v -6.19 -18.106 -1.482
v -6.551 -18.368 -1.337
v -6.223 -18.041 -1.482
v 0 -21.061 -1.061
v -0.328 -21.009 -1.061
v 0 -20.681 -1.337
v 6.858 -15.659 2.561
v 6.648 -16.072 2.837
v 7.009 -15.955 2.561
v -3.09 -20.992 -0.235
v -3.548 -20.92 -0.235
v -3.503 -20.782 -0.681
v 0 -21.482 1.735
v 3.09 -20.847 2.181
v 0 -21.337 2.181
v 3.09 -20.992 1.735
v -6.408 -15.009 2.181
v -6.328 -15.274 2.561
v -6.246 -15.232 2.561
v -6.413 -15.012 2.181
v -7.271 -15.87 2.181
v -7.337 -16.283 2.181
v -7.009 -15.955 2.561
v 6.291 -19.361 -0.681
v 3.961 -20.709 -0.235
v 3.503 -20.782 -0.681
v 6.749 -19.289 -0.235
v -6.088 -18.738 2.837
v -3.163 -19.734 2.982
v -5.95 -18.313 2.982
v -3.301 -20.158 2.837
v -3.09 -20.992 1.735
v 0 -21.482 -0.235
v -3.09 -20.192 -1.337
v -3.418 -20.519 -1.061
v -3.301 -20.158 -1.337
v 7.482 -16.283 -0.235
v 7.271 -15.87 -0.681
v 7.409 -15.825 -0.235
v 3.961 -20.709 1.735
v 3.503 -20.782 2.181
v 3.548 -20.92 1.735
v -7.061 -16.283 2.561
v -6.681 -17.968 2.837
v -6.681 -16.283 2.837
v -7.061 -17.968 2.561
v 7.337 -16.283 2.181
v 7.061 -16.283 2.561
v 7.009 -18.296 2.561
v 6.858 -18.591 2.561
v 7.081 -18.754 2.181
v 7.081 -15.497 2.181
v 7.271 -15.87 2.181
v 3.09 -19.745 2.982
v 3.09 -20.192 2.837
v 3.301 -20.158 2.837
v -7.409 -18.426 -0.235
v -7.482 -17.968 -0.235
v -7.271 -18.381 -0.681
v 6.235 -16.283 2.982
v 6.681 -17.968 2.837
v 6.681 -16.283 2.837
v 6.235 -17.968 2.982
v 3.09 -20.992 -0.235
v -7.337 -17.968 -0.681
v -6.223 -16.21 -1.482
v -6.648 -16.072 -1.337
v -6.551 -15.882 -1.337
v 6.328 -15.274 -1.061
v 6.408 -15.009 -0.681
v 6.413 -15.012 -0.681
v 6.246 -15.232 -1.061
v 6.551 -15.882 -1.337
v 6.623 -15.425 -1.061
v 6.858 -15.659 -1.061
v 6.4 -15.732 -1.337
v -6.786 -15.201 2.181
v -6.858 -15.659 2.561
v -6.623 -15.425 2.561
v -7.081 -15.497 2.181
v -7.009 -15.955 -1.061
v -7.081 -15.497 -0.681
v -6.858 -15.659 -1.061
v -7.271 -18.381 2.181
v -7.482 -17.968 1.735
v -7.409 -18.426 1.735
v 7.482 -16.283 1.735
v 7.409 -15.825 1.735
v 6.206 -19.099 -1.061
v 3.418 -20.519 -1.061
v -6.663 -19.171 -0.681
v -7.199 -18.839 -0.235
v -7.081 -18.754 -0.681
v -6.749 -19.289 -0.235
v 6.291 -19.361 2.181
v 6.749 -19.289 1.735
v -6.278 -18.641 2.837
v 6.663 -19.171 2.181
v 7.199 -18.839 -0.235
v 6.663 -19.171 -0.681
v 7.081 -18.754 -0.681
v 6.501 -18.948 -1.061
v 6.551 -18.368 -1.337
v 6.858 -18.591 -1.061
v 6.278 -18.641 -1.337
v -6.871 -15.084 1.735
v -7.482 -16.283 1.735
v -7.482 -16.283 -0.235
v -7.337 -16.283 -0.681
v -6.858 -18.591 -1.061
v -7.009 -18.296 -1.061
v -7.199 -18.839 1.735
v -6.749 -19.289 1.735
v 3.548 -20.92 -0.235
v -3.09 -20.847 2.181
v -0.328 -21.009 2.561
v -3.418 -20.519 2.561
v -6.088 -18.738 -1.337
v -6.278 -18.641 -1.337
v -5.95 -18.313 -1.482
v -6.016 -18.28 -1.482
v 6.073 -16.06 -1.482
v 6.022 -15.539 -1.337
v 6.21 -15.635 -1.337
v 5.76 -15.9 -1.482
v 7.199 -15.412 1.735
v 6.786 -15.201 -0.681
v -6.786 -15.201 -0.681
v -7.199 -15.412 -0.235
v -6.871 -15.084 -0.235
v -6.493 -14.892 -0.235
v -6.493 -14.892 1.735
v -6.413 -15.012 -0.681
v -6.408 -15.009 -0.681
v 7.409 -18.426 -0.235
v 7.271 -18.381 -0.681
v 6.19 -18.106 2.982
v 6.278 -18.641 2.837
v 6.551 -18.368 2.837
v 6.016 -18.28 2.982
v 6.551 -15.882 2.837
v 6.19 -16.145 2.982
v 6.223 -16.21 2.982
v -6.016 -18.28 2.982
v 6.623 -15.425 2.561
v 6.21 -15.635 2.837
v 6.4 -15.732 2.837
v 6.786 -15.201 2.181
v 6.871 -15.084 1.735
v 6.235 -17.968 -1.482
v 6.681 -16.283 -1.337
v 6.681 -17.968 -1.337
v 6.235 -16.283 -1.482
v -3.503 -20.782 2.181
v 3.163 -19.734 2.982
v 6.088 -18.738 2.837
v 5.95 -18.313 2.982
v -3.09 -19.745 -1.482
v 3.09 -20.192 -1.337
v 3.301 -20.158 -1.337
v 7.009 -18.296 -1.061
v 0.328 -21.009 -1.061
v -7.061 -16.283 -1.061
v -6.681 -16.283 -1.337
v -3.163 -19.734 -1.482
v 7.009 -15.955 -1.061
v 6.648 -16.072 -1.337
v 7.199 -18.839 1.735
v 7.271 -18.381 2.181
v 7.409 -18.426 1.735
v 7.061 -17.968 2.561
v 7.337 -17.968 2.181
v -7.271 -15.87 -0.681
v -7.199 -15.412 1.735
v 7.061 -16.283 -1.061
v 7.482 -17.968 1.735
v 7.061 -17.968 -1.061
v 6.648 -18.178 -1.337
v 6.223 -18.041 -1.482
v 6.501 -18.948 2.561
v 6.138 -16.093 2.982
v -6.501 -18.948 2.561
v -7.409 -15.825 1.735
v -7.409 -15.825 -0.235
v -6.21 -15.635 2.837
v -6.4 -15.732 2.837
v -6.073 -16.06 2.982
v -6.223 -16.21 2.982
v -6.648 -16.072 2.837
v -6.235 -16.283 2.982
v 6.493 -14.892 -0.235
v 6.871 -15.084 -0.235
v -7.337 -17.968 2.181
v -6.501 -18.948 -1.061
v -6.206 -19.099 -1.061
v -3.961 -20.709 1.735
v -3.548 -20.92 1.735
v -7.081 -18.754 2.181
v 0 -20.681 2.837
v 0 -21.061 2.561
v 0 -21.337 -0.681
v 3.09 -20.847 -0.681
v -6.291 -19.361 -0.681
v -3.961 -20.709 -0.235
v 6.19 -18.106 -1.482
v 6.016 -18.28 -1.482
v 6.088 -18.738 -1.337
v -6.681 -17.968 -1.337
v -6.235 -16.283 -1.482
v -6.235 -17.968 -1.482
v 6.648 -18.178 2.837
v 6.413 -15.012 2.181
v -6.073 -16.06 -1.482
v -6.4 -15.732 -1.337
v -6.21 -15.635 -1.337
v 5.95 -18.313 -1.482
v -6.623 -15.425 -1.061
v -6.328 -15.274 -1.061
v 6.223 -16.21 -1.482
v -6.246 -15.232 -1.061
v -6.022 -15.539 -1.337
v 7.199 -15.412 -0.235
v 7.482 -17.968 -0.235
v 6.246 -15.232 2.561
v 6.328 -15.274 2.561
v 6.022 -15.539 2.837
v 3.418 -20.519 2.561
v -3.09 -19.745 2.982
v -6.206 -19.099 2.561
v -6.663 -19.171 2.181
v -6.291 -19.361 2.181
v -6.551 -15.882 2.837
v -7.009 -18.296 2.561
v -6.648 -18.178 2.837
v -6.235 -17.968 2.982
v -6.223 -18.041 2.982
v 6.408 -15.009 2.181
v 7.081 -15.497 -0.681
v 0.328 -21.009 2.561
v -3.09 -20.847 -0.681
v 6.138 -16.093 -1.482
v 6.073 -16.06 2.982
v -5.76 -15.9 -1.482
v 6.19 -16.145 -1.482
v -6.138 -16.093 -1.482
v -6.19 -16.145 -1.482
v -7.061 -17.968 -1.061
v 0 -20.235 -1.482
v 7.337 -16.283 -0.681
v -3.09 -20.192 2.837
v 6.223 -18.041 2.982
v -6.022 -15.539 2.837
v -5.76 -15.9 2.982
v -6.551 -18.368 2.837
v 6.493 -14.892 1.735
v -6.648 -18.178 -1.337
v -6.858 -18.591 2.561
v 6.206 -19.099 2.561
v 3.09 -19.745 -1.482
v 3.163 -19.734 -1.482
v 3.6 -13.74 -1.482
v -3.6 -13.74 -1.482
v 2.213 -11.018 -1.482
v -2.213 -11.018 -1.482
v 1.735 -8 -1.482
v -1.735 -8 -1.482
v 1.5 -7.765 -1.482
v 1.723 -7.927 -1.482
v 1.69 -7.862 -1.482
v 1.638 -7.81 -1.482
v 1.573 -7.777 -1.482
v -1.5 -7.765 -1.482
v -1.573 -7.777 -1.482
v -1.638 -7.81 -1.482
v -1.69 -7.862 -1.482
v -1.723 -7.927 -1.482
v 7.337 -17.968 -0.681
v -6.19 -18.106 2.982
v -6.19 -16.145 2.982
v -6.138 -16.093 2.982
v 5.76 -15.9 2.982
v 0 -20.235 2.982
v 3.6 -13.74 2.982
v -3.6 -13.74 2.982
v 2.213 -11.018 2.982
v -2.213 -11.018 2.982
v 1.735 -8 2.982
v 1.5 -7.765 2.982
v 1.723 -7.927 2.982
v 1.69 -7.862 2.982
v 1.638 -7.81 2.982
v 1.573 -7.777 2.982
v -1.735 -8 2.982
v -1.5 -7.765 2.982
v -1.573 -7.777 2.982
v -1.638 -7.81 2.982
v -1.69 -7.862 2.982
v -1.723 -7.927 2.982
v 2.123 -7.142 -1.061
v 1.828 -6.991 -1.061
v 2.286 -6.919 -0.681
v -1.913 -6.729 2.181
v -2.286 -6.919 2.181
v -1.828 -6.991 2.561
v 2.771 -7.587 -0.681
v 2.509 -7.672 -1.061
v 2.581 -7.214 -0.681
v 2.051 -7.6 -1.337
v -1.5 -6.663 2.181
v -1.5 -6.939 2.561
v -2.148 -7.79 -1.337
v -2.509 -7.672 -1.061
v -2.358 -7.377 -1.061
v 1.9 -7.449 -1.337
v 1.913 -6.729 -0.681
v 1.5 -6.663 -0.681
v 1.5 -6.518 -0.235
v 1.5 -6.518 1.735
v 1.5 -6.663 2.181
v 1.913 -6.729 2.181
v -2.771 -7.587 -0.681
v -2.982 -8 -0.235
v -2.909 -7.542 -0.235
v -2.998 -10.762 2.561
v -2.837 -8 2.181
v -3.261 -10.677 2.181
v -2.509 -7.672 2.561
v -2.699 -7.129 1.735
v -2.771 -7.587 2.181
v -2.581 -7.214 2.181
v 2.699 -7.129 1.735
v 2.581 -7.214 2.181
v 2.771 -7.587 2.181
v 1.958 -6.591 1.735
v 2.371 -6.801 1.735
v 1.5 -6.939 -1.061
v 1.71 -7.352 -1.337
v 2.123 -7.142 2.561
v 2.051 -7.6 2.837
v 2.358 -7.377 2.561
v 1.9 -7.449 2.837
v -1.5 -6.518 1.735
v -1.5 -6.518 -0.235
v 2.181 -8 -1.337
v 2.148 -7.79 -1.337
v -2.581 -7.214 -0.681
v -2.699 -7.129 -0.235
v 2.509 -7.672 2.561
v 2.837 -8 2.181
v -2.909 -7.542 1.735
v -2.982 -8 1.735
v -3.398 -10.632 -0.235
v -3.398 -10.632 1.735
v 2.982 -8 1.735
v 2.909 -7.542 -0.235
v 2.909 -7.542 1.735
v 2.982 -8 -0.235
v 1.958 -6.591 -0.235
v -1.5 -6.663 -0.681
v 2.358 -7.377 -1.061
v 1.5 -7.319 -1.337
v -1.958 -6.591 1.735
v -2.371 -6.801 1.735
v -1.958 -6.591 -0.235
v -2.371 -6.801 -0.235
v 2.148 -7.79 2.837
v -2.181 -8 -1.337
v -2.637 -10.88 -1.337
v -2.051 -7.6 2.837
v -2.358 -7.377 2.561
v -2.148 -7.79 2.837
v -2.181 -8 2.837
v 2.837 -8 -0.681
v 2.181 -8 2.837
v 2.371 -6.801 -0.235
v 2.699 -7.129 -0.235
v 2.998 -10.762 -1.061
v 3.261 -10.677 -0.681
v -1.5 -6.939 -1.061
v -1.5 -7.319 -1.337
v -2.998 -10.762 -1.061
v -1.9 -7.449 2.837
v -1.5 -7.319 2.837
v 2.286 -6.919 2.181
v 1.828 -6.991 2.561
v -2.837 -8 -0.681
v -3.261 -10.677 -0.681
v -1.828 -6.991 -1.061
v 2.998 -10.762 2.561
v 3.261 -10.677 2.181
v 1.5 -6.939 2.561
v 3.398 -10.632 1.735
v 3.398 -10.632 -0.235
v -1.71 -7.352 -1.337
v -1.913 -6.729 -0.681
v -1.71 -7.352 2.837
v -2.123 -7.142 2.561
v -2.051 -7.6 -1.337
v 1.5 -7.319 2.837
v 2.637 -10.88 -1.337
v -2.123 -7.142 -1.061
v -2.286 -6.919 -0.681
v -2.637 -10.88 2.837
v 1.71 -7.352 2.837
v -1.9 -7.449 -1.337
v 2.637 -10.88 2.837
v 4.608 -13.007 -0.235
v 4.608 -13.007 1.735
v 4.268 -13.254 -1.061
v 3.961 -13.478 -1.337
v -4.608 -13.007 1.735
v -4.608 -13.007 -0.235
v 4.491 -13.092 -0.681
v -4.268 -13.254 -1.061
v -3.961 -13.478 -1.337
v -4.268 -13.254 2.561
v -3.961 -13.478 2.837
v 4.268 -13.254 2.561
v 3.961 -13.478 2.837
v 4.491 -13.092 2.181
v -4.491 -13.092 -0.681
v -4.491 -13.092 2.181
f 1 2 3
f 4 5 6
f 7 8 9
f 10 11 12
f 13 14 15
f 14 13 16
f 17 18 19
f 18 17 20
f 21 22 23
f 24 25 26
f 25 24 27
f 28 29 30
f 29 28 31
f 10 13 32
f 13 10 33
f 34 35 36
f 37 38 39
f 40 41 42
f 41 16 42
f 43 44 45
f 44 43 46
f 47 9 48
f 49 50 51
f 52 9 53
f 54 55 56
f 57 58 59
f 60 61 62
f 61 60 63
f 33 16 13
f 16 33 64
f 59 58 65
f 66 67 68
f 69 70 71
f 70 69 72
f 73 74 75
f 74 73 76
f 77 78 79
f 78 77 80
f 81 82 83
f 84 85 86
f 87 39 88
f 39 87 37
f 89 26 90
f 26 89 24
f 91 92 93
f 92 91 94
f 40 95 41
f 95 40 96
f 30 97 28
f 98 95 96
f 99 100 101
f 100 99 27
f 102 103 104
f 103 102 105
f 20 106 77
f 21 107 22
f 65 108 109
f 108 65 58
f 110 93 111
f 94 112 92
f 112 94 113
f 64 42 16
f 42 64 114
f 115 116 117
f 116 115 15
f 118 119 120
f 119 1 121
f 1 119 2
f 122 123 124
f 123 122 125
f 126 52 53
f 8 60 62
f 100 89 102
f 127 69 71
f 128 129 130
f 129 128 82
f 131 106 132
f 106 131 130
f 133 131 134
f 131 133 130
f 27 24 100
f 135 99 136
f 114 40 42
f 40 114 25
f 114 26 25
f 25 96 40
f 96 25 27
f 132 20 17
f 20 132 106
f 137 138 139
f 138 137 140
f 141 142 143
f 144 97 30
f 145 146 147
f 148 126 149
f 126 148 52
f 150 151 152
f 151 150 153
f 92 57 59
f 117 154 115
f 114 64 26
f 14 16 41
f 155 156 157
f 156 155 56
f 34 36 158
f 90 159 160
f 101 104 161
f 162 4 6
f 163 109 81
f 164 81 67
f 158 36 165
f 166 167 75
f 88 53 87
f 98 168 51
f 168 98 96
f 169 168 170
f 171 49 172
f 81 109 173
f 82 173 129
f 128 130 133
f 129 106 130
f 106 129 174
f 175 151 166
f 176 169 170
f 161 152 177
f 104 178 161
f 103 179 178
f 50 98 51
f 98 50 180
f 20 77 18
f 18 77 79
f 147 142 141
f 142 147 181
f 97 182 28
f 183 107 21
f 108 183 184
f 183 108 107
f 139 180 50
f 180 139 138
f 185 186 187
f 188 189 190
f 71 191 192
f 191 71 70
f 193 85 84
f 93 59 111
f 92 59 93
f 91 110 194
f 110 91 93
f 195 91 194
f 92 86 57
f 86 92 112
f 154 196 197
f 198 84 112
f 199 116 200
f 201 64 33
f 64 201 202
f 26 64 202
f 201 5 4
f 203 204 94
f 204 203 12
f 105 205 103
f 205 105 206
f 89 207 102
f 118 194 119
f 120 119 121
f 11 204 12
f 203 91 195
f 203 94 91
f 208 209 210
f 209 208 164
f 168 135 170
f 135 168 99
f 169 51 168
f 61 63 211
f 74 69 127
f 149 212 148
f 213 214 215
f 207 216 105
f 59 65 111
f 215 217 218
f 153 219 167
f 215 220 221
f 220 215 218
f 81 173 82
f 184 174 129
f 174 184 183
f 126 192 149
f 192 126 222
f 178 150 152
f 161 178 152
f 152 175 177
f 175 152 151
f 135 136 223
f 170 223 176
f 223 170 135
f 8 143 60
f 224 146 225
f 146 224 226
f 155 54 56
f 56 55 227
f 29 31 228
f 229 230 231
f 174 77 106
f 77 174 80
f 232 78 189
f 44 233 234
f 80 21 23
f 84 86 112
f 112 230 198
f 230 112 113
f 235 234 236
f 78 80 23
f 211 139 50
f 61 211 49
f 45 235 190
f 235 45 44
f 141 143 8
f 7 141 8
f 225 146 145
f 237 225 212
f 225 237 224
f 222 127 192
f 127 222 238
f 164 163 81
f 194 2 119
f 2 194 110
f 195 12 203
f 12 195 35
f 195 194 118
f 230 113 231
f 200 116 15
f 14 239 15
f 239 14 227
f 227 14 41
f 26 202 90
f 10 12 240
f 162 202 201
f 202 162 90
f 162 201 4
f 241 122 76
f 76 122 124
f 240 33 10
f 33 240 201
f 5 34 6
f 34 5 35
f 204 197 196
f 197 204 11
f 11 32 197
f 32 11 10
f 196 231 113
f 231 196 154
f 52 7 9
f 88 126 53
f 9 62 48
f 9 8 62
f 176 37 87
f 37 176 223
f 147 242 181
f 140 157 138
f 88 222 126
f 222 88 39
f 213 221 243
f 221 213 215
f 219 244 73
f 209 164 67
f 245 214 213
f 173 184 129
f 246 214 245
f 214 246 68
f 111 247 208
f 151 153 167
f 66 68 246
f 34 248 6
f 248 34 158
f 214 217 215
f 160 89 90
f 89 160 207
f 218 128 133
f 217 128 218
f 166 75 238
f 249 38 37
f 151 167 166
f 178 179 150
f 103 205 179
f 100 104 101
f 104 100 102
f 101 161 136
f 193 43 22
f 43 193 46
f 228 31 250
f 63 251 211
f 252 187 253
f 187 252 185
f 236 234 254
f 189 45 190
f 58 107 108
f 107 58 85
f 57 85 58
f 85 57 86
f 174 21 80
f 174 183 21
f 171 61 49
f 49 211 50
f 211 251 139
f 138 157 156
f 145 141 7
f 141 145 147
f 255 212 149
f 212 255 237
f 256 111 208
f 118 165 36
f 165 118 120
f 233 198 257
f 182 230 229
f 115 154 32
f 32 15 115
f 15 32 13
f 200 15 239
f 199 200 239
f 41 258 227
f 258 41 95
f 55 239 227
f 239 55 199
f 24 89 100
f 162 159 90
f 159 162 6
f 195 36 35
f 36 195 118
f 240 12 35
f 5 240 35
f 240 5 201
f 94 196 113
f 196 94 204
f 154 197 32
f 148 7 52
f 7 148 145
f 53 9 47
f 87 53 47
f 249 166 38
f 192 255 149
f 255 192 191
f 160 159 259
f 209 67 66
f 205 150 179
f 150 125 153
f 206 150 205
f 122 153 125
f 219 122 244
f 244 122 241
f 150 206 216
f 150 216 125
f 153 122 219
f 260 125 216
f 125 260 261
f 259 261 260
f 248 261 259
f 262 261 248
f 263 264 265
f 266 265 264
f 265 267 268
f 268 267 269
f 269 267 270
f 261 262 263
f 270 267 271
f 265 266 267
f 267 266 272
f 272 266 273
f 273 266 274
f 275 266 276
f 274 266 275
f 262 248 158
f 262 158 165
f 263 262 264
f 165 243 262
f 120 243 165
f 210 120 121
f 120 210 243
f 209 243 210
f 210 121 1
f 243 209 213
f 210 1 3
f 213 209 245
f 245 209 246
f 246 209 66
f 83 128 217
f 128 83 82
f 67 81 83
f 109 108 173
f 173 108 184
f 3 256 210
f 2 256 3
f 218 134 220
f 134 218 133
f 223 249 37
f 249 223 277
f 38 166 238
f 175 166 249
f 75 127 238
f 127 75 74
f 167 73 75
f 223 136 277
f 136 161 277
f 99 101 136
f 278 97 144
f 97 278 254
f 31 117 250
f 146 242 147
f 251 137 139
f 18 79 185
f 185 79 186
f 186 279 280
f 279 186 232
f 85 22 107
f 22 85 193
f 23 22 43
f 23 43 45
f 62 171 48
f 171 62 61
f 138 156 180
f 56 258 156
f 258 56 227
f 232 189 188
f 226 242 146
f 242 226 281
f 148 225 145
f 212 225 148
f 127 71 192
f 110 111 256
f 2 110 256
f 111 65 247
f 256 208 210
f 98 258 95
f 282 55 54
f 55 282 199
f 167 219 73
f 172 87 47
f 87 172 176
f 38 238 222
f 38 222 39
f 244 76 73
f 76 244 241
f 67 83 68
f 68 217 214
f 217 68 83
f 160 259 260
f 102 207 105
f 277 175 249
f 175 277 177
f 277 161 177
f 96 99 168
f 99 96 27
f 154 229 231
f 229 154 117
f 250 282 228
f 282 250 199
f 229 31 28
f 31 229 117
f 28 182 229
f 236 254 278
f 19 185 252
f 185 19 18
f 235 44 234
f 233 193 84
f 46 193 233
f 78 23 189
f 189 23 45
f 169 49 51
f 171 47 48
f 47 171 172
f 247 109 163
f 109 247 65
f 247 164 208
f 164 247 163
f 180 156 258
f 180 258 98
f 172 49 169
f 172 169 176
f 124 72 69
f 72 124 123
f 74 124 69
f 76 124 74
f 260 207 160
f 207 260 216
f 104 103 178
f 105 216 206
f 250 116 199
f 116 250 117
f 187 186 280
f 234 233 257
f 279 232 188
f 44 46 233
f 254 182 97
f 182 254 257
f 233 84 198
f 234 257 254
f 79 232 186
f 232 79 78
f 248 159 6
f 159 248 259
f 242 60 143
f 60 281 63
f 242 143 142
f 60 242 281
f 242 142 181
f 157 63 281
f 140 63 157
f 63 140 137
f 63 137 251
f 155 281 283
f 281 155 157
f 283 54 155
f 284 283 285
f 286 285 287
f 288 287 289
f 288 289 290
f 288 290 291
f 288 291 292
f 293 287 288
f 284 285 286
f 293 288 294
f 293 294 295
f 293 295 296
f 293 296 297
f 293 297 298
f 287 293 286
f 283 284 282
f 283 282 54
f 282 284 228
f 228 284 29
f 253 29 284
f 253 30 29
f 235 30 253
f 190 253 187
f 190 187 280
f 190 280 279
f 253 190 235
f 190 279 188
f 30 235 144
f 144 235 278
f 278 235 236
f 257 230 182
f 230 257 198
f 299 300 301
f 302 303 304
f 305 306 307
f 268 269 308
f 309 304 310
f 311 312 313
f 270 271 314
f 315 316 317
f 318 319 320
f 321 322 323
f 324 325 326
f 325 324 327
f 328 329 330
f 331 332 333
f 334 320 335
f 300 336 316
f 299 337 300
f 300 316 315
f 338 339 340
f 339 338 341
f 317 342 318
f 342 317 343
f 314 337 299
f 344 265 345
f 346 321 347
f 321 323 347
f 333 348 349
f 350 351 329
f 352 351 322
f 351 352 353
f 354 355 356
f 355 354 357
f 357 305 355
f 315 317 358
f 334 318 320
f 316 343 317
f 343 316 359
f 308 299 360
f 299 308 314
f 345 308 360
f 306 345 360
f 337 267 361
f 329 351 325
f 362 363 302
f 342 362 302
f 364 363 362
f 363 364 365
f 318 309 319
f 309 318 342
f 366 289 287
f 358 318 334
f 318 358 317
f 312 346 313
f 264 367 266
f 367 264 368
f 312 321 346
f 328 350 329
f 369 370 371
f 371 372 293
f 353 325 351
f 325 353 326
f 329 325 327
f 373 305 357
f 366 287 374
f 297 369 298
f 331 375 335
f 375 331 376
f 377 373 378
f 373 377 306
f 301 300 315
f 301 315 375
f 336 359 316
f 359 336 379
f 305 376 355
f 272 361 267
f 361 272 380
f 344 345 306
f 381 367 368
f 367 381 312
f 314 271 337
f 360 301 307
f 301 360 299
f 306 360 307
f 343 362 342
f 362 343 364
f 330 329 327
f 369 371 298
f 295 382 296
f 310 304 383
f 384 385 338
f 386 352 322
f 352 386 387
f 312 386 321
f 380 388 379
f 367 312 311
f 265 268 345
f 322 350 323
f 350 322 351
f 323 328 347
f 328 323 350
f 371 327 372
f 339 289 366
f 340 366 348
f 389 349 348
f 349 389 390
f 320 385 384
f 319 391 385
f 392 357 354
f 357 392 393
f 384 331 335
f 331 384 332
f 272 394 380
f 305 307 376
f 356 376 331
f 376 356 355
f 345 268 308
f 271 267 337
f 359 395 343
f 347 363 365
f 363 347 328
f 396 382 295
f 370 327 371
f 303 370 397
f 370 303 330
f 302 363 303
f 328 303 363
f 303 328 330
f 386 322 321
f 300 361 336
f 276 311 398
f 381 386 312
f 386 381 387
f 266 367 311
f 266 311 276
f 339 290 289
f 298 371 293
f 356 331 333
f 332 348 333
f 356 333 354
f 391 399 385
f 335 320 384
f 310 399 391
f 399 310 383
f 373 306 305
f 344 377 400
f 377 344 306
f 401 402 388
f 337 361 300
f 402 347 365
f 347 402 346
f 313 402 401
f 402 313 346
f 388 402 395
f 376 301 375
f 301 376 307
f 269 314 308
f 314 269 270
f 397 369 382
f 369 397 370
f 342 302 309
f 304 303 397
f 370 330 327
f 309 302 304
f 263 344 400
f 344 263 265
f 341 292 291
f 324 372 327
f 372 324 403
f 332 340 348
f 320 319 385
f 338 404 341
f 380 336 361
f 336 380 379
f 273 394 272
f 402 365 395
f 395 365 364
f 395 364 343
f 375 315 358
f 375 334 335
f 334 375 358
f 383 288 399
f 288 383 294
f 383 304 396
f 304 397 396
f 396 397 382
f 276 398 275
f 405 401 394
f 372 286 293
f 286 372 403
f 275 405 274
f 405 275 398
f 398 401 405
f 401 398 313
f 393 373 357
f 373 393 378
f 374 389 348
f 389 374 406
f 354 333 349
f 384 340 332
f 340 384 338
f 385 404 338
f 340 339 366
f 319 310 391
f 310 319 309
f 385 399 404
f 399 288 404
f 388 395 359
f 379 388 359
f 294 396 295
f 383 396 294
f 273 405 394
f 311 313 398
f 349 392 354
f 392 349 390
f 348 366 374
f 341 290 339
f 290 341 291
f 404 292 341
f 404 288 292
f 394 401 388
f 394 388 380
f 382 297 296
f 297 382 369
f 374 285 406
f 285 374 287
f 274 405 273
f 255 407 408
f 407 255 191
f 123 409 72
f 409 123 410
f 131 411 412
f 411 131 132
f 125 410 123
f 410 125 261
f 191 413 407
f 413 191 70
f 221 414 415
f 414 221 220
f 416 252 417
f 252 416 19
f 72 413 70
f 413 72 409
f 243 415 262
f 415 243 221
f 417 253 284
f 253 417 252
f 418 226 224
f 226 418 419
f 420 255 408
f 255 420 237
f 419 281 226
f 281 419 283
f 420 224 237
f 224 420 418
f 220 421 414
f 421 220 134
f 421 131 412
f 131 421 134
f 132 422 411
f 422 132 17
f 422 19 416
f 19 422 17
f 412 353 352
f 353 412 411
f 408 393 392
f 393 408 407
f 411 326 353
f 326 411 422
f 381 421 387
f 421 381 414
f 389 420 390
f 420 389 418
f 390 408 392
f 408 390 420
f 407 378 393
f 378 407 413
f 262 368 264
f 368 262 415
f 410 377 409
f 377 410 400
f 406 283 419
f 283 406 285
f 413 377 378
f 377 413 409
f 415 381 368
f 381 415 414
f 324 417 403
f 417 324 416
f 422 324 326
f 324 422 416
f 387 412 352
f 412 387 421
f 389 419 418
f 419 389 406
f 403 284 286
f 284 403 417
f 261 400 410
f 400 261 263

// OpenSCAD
$fn = 20;

minkowski(){
difference() {
        cylinder (h = 1.5, r=10);
        translate ([0,6,0]) cube([11.5,8,4], center=true);
        translate ([8,-8,0]) cube([4,4,4], center=true);
        translate ([-8,-8,0]) cube([4,4,4], center=true);
        translate ([-11.5,2,0]) cylinder (h = 4, r=10, center = true);
        translate ([11.5,2,0]) cylinder (h = 4, r=10, center = true);
}

translate([0,-10,0]) sphere(1.5);
}
